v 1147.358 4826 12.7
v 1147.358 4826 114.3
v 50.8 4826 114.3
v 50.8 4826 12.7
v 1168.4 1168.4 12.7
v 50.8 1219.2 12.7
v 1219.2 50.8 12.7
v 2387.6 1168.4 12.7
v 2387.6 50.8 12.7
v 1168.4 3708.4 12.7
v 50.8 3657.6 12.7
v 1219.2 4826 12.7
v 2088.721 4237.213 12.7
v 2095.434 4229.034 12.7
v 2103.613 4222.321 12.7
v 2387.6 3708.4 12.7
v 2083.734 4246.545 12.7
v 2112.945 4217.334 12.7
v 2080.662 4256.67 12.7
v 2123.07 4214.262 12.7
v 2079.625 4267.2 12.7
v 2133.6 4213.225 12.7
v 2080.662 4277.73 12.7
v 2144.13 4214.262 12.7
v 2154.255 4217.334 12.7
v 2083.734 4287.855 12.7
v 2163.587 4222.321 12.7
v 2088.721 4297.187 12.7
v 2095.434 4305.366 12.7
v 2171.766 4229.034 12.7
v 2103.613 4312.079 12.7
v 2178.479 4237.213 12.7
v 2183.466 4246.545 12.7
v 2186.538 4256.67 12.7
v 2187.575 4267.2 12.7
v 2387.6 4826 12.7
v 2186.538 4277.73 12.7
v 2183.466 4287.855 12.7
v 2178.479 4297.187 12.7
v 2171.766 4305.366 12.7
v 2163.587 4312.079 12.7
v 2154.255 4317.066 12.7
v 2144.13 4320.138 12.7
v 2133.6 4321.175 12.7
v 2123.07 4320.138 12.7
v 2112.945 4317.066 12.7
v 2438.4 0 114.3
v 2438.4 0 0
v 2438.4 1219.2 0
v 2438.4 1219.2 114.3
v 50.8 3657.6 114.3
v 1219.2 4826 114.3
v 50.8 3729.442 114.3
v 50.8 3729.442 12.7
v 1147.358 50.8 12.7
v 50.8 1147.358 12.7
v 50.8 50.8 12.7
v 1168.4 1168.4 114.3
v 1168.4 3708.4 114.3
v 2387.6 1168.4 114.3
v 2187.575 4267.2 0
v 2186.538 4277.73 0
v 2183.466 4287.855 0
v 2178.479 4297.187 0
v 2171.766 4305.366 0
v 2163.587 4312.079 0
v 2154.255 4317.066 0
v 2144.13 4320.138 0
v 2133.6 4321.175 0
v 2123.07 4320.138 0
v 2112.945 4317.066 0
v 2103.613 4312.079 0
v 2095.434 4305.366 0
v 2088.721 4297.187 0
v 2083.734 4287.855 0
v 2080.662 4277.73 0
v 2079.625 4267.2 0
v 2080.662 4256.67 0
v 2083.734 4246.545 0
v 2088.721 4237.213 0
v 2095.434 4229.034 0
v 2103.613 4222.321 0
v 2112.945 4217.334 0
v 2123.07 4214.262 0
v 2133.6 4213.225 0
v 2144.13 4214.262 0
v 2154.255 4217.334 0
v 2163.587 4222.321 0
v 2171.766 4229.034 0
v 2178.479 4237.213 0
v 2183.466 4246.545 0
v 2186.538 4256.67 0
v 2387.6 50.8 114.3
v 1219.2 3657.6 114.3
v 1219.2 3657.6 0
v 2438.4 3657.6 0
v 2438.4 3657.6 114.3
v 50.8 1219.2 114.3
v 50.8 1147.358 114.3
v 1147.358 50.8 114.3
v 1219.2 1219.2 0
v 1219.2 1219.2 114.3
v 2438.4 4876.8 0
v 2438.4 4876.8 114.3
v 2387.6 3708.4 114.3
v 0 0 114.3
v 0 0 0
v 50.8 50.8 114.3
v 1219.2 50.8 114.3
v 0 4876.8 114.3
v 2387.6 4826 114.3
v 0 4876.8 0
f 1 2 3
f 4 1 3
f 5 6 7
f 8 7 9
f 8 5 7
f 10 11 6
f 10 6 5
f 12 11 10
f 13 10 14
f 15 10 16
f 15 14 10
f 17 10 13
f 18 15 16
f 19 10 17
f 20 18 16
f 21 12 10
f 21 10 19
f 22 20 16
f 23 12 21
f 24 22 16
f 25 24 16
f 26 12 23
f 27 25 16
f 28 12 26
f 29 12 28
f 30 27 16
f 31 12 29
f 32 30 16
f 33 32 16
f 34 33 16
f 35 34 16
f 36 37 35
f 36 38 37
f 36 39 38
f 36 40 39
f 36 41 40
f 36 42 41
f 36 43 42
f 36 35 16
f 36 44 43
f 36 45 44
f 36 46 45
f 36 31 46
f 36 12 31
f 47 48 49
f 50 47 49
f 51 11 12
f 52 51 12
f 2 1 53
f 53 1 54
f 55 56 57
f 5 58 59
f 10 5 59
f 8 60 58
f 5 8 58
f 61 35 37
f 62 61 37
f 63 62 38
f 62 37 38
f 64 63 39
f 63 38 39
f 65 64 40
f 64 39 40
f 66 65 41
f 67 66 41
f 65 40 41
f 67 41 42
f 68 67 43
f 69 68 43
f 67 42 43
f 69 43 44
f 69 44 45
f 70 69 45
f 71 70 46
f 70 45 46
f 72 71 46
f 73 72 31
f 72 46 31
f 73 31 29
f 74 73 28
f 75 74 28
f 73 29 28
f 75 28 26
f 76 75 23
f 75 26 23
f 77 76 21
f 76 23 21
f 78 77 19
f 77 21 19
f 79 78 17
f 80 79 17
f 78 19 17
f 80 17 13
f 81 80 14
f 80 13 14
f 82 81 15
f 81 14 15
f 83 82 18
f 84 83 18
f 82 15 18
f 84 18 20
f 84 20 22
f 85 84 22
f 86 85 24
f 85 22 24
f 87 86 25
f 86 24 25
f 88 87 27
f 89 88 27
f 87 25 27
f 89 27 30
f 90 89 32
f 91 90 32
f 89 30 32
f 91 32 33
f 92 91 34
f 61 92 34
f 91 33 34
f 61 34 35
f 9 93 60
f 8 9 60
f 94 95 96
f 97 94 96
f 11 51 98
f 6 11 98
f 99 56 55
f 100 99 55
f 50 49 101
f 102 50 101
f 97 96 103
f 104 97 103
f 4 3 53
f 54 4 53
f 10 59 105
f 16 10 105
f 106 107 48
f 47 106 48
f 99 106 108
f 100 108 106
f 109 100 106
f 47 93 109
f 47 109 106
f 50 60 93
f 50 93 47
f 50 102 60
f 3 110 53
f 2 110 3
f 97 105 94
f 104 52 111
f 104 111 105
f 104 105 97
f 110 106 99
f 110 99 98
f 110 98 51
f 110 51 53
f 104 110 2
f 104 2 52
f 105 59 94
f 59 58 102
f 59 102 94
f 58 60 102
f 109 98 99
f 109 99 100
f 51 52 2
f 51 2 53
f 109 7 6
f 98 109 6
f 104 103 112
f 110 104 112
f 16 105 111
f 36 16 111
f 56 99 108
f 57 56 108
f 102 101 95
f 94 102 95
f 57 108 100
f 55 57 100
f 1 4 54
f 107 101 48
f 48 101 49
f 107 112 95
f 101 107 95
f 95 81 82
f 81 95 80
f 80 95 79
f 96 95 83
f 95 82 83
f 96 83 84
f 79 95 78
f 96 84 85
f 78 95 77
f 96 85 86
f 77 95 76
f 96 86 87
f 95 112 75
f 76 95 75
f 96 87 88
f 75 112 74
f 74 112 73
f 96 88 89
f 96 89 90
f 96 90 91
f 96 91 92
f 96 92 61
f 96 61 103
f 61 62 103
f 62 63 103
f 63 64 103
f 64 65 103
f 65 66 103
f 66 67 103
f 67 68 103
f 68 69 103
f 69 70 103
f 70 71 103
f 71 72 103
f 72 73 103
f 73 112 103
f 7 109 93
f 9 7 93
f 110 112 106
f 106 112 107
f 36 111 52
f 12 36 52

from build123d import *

# Parameters (mm, degrees)
F1_DEPTH = 114.3
F3_DEPTH = 101.6
F4_R     = 53.975
F5_DEPTH = 12.7
F7_DEPTH = 101.6


with BuildPart() as f1:
    # F0 (on Top) → F1 (new body)
    with BuildSketch(Plane.XY):
        Polygon((0, 4876.8), (0, 0), (2438.4, 0), (2438.4, 1219.2), (1219.2, 1219.2), (1219.2, 3657.6), (2438.4, 3657.6), (2438.4, 4876.8), align=None)
    extrude(amount=F1_DEPTH)

    # F2 (on face) → F3 (cut)
    with BuildSketch(Plane.XY.offset(114.3)):
        Polygon((2387.6, 4826), (50.8, 4826), (50.8, 50.8), (2387.6, 50.8), (2387.6, 1168.4), (1168.4, 1168.4), (1168.4, 3708.4), (2387.6, 3708.4), align=None)
    extrude(amount=-F3_DEPTH, mode=Mode.SUBTRACT)

    # F4 (on face) → F5 (cut)
    with BuildSketch(Plane.XY.offset(12.7)):
        with Locations((2133.6, 4267.2)):
            Circle(F4_R)
    extrude(amount=-F5_DEPTH, mode=Mode.SUBTRACT)

    # F6 (on face) → F7 (join)
    with BuildSketch(Plane.XY.offset(12.7)):
        Polygon((1147.357951, 4826), (50.8, 3729.442049), (50.8, 3657.6), (1219.2, 4826), align=None)
        Polygon((50.8, 1147.357951), (1147.357951, 50.8), (1219.2, 50.8), (50.8, 1219.2), align=None)
    extrude(amount=F7_DEPTH)


solid = f1.part
